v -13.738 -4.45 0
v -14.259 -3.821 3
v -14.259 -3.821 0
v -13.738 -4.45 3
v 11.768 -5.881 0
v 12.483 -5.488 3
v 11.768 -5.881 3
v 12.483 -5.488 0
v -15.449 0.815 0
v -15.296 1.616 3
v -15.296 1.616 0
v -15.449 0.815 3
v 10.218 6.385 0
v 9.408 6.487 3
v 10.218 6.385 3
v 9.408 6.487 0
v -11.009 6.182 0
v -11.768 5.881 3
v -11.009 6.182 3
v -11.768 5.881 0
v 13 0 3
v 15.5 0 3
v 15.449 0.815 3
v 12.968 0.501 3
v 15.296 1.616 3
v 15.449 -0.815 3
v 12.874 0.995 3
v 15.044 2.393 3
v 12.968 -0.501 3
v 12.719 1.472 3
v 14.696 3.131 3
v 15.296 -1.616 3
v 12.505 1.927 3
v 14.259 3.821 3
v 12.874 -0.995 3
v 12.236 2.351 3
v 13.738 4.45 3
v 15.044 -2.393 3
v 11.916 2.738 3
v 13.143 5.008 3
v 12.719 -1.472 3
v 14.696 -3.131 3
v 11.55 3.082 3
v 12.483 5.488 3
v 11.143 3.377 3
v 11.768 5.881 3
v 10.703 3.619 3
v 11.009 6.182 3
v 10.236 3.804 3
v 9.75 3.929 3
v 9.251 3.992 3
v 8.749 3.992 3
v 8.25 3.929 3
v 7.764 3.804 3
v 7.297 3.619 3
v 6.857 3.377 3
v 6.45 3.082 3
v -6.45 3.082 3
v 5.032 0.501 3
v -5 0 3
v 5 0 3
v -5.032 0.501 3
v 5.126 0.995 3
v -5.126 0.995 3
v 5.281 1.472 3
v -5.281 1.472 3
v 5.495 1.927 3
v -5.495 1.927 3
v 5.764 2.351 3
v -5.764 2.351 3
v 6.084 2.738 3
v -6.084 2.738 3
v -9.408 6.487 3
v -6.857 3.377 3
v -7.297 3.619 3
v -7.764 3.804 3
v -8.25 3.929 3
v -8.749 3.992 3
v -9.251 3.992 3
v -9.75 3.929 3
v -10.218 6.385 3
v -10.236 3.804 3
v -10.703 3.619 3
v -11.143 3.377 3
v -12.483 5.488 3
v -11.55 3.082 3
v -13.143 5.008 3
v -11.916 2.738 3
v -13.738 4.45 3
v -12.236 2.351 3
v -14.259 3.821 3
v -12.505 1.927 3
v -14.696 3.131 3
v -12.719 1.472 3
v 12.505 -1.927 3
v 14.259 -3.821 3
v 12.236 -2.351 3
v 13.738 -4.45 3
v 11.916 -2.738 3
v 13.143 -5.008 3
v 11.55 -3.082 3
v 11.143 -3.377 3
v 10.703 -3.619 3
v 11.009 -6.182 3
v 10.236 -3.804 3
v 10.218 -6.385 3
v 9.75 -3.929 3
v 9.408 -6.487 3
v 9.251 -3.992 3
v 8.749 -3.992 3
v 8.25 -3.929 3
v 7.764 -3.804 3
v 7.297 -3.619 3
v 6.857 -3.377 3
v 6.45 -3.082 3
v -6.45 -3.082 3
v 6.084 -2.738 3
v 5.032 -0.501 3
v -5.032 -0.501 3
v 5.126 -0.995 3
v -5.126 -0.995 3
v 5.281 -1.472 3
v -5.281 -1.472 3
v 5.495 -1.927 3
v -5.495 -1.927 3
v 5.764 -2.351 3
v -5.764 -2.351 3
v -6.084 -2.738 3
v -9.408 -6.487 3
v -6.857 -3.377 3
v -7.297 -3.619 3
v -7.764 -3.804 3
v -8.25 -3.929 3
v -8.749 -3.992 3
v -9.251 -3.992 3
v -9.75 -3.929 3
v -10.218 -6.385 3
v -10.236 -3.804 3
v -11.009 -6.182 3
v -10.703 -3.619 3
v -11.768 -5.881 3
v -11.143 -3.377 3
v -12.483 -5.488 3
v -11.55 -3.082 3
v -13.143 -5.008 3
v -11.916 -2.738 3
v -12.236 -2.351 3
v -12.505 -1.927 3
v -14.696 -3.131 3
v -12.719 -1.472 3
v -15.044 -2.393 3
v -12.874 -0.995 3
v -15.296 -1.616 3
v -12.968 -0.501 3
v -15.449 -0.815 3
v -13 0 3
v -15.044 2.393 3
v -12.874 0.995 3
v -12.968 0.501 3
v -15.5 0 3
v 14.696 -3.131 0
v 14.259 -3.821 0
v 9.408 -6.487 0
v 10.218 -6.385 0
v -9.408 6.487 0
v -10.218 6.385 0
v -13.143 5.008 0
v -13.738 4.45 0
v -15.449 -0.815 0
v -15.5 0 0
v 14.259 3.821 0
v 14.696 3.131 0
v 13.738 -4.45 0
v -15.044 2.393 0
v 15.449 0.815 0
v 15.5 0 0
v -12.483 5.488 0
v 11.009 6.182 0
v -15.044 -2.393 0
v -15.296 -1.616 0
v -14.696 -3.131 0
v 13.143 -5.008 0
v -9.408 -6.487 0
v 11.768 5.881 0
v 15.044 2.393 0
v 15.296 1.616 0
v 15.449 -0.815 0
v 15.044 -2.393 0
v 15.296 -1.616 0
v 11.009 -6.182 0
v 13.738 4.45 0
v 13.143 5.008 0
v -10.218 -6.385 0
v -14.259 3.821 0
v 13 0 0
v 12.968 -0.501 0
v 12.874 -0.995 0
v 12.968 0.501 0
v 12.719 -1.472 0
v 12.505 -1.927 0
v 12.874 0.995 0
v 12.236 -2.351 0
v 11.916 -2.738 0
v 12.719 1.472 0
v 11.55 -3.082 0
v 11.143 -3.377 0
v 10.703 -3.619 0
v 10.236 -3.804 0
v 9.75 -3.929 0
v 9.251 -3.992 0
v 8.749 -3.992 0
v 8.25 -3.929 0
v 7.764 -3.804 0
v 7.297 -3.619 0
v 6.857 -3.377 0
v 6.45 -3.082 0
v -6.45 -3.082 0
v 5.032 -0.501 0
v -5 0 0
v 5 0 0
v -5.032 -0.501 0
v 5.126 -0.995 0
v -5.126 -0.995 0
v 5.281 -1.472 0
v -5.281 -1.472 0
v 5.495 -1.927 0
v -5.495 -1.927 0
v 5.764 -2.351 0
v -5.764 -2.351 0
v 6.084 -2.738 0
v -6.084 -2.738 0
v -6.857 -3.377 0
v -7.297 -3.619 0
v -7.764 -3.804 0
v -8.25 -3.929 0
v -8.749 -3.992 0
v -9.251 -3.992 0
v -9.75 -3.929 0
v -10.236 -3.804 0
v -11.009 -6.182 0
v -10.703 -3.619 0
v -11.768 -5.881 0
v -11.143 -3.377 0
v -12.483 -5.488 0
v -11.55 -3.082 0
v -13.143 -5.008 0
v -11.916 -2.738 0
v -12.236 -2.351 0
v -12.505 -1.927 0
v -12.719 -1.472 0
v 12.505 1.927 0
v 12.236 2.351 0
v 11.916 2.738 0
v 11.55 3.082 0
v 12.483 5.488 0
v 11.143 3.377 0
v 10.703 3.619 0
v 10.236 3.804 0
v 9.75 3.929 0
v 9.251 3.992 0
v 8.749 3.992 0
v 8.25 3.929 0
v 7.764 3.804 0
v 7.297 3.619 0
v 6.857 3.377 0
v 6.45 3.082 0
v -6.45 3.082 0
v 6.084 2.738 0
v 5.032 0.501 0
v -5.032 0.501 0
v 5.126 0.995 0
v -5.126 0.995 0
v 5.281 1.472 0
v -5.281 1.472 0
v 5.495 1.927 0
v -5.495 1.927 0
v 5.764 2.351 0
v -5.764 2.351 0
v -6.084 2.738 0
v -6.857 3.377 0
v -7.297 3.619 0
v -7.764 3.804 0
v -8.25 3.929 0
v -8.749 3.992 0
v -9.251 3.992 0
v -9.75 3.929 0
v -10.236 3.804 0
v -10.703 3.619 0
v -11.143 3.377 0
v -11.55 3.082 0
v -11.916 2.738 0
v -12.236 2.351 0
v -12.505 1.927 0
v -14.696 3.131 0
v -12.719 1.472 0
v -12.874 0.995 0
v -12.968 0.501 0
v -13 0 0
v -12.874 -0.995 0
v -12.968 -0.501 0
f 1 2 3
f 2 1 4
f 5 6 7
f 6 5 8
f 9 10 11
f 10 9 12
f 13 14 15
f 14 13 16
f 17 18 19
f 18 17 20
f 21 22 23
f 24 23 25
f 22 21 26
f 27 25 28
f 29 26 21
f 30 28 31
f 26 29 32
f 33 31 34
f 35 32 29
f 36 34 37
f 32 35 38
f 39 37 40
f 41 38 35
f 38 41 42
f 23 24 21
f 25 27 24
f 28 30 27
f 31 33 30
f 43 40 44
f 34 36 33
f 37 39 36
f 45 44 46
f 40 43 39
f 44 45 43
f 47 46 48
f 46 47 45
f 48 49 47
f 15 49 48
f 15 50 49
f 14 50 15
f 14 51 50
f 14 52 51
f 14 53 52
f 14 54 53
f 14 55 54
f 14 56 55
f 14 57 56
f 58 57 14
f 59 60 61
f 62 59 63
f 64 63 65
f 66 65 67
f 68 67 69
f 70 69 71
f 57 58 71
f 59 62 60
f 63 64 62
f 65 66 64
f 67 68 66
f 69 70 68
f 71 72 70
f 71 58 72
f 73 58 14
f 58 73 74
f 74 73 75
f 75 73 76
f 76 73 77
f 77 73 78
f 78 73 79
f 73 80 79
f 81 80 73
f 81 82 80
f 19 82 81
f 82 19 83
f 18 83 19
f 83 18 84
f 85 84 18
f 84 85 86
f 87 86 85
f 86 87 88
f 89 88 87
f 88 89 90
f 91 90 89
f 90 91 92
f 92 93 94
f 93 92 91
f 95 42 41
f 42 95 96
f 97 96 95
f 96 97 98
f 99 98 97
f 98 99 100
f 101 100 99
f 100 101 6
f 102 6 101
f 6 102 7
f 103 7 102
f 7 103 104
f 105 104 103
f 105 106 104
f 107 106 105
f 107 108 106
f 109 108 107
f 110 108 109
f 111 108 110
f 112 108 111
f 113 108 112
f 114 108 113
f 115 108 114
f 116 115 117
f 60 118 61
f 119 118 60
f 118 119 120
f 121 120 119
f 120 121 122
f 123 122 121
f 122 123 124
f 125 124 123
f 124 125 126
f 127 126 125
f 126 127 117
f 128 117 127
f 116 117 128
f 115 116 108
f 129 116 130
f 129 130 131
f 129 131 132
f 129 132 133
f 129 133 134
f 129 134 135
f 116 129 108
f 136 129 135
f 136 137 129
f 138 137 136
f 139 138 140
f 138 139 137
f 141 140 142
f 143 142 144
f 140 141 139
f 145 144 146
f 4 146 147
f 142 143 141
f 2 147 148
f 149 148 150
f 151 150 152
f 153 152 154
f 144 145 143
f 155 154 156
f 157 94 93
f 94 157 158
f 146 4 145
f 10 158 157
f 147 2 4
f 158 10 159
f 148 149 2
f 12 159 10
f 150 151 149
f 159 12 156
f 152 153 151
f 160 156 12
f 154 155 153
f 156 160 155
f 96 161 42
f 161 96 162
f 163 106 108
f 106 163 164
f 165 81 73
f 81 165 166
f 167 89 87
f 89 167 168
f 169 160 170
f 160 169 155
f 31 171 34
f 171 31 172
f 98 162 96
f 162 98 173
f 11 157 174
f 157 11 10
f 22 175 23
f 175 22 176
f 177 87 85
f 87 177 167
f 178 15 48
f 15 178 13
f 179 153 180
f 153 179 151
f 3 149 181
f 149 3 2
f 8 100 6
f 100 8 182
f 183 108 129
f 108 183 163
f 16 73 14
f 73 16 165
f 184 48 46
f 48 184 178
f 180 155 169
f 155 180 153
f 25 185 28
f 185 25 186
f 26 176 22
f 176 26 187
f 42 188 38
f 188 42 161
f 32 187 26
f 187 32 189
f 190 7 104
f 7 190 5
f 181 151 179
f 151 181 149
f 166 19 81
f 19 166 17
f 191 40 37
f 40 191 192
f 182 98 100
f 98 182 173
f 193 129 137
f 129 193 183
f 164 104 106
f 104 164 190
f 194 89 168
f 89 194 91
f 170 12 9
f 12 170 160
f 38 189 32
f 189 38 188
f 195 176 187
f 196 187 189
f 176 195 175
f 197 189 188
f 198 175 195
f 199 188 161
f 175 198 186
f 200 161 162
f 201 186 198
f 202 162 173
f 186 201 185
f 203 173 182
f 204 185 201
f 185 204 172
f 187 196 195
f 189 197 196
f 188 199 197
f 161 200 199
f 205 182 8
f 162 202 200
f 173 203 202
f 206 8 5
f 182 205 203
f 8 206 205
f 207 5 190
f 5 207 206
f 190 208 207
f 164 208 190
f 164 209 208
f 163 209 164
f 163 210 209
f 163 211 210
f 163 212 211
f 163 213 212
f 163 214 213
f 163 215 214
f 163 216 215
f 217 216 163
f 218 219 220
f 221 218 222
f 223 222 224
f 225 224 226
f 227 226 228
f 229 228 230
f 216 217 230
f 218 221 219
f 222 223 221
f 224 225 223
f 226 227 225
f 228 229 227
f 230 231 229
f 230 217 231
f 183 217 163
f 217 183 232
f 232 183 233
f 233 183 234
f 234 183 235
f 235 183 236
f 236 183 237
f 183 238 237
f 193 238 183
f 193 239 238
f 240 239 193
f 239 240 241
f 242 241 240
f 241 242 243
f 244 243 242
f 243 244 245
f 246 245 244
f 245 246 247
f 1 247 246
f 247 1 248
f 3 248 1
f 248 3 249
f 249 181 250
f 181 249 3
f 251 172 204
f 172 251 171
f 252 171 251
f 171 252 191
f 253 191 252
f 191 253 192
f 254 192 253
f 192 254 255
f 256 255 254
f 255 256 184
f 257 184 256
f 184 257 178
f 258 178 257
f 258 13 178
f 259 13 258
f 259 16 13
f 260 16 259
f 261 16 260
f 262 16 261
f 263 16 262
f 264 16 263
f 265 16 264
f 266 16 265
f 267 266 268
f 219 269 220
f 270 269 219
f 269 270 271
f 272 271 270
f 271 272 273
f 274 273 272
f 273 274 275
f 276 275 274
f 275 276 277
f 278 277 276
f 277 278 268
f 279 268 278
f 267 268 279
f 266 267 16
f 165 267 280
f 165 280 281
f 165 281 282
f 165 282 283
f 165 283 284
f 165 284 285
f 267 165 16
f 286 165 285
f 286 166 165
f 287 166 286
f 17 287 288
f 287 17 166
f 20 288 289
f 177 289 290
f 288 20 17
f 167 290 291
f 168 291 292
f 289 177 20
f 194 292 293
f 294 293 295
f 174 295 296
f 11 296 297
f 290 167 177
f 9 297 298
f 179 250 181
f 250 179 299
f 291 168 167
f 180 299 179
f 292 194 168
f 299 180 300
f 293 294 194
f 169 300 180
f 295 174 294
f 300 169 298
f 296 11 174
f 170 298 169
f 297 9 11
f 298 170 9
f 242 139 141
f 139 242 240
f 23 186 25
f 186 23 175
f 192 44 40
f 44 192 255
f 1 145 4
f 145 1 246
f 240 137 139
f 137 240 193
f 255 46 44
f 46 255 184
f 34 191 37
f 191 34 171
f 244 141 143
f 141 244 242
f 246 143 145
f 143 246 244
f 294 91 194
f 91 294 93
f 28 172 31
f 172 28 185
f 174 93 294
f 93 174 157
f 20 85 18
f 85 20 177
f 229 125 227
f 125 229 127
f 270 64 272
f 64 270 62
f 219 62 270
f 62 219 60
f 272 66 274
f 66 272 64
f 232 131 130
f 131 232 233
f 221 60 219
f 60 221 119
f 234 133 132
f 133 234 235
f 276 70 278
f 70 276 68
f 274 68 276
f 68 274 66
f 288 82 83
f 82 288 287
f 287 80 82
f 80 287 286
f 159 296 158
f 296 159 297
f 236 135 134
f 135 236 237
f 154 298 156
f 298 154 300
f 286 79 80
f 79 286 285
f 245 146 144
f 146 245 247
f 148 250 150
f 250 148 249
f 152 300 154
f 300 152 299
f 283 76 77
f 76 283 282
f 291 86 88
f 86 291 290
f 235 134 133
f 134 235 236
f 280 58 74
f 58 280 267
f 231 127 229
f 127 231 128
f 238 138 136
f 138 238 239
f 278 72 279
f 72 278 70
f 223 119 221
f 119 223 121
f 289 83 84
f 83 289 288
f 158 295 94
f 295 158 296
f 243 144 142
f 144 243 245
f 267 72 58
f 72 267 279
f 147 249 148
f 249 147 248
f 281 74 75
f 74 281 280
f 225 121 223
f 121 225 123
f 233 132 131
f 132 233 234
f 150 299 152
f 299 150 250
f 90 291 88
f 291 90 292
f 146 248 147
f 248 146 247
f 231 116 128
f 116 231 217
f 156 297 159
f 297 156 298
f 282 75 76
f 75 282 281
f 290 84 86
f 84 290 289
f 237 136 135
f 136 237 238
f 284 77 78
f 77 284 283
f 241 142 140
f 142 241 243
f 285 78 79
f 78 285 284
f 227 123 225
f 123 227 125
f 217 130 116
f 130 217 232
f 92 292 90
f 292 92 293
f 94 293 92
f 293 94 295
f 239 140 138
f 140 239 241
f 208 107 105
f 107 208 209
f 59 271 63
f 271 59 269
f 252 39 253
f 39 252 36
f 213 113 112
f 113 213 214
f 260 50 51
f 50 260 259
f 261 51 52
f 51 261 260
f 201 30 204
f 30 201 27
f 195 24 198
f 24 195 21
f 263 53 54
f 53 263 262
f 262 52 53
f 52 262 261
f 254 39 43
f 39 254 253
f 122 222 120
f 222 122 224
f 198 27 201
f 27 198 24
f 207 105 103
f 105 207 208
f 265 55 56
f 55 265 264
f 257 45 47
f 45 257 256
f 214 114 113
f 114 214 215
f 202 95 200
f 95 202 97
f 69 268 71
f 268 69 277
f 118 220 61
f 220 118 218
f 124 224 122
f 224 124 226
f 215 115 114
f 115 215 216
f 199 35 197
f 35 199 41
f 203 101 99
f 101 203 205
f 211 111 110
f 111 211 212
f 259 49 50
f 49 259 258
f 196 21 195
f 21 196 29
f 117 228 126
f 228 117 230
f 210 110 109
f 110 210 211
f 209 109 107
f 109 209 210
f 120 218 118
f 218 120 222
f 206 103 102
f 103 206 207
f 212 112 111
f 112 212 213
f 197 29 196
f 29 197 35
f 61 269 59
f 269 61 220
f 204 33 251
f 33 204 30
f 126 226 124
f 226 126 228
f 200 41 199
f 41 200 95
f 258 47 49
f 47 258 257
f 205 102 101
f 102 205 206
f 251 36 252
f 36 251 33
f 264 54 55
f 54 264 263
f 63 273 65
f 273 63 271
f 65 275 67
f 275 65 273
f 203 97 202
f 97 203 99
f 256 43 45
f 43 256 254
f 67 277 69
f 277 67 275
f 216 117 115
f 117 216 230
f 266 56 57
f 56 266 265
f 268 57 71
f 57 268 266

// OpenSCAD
OUTER_DIA = 13;
INNER_DIA = 8;
THICKNESS = 3;
SPACING = 18;

$fn = 50;

difference() {
  hull() {
    translate([-SPACING/2, 0, 0])
    cylinder(d = OUTER_DIA, h = THICKNESS);
    translate([SPACING/2, 0, 0])
    cylinder(d = OUTER_DIA, h = THICKNESS);
  }

  translate([-SPACING/2, 0, 0])
  cylinder(d = INNER_DIA, h = THICKNESS);
  translate([SPACING/2, 0, 0])
  cylinder(d = INNER_DIA, h = THICKNESS);
}
